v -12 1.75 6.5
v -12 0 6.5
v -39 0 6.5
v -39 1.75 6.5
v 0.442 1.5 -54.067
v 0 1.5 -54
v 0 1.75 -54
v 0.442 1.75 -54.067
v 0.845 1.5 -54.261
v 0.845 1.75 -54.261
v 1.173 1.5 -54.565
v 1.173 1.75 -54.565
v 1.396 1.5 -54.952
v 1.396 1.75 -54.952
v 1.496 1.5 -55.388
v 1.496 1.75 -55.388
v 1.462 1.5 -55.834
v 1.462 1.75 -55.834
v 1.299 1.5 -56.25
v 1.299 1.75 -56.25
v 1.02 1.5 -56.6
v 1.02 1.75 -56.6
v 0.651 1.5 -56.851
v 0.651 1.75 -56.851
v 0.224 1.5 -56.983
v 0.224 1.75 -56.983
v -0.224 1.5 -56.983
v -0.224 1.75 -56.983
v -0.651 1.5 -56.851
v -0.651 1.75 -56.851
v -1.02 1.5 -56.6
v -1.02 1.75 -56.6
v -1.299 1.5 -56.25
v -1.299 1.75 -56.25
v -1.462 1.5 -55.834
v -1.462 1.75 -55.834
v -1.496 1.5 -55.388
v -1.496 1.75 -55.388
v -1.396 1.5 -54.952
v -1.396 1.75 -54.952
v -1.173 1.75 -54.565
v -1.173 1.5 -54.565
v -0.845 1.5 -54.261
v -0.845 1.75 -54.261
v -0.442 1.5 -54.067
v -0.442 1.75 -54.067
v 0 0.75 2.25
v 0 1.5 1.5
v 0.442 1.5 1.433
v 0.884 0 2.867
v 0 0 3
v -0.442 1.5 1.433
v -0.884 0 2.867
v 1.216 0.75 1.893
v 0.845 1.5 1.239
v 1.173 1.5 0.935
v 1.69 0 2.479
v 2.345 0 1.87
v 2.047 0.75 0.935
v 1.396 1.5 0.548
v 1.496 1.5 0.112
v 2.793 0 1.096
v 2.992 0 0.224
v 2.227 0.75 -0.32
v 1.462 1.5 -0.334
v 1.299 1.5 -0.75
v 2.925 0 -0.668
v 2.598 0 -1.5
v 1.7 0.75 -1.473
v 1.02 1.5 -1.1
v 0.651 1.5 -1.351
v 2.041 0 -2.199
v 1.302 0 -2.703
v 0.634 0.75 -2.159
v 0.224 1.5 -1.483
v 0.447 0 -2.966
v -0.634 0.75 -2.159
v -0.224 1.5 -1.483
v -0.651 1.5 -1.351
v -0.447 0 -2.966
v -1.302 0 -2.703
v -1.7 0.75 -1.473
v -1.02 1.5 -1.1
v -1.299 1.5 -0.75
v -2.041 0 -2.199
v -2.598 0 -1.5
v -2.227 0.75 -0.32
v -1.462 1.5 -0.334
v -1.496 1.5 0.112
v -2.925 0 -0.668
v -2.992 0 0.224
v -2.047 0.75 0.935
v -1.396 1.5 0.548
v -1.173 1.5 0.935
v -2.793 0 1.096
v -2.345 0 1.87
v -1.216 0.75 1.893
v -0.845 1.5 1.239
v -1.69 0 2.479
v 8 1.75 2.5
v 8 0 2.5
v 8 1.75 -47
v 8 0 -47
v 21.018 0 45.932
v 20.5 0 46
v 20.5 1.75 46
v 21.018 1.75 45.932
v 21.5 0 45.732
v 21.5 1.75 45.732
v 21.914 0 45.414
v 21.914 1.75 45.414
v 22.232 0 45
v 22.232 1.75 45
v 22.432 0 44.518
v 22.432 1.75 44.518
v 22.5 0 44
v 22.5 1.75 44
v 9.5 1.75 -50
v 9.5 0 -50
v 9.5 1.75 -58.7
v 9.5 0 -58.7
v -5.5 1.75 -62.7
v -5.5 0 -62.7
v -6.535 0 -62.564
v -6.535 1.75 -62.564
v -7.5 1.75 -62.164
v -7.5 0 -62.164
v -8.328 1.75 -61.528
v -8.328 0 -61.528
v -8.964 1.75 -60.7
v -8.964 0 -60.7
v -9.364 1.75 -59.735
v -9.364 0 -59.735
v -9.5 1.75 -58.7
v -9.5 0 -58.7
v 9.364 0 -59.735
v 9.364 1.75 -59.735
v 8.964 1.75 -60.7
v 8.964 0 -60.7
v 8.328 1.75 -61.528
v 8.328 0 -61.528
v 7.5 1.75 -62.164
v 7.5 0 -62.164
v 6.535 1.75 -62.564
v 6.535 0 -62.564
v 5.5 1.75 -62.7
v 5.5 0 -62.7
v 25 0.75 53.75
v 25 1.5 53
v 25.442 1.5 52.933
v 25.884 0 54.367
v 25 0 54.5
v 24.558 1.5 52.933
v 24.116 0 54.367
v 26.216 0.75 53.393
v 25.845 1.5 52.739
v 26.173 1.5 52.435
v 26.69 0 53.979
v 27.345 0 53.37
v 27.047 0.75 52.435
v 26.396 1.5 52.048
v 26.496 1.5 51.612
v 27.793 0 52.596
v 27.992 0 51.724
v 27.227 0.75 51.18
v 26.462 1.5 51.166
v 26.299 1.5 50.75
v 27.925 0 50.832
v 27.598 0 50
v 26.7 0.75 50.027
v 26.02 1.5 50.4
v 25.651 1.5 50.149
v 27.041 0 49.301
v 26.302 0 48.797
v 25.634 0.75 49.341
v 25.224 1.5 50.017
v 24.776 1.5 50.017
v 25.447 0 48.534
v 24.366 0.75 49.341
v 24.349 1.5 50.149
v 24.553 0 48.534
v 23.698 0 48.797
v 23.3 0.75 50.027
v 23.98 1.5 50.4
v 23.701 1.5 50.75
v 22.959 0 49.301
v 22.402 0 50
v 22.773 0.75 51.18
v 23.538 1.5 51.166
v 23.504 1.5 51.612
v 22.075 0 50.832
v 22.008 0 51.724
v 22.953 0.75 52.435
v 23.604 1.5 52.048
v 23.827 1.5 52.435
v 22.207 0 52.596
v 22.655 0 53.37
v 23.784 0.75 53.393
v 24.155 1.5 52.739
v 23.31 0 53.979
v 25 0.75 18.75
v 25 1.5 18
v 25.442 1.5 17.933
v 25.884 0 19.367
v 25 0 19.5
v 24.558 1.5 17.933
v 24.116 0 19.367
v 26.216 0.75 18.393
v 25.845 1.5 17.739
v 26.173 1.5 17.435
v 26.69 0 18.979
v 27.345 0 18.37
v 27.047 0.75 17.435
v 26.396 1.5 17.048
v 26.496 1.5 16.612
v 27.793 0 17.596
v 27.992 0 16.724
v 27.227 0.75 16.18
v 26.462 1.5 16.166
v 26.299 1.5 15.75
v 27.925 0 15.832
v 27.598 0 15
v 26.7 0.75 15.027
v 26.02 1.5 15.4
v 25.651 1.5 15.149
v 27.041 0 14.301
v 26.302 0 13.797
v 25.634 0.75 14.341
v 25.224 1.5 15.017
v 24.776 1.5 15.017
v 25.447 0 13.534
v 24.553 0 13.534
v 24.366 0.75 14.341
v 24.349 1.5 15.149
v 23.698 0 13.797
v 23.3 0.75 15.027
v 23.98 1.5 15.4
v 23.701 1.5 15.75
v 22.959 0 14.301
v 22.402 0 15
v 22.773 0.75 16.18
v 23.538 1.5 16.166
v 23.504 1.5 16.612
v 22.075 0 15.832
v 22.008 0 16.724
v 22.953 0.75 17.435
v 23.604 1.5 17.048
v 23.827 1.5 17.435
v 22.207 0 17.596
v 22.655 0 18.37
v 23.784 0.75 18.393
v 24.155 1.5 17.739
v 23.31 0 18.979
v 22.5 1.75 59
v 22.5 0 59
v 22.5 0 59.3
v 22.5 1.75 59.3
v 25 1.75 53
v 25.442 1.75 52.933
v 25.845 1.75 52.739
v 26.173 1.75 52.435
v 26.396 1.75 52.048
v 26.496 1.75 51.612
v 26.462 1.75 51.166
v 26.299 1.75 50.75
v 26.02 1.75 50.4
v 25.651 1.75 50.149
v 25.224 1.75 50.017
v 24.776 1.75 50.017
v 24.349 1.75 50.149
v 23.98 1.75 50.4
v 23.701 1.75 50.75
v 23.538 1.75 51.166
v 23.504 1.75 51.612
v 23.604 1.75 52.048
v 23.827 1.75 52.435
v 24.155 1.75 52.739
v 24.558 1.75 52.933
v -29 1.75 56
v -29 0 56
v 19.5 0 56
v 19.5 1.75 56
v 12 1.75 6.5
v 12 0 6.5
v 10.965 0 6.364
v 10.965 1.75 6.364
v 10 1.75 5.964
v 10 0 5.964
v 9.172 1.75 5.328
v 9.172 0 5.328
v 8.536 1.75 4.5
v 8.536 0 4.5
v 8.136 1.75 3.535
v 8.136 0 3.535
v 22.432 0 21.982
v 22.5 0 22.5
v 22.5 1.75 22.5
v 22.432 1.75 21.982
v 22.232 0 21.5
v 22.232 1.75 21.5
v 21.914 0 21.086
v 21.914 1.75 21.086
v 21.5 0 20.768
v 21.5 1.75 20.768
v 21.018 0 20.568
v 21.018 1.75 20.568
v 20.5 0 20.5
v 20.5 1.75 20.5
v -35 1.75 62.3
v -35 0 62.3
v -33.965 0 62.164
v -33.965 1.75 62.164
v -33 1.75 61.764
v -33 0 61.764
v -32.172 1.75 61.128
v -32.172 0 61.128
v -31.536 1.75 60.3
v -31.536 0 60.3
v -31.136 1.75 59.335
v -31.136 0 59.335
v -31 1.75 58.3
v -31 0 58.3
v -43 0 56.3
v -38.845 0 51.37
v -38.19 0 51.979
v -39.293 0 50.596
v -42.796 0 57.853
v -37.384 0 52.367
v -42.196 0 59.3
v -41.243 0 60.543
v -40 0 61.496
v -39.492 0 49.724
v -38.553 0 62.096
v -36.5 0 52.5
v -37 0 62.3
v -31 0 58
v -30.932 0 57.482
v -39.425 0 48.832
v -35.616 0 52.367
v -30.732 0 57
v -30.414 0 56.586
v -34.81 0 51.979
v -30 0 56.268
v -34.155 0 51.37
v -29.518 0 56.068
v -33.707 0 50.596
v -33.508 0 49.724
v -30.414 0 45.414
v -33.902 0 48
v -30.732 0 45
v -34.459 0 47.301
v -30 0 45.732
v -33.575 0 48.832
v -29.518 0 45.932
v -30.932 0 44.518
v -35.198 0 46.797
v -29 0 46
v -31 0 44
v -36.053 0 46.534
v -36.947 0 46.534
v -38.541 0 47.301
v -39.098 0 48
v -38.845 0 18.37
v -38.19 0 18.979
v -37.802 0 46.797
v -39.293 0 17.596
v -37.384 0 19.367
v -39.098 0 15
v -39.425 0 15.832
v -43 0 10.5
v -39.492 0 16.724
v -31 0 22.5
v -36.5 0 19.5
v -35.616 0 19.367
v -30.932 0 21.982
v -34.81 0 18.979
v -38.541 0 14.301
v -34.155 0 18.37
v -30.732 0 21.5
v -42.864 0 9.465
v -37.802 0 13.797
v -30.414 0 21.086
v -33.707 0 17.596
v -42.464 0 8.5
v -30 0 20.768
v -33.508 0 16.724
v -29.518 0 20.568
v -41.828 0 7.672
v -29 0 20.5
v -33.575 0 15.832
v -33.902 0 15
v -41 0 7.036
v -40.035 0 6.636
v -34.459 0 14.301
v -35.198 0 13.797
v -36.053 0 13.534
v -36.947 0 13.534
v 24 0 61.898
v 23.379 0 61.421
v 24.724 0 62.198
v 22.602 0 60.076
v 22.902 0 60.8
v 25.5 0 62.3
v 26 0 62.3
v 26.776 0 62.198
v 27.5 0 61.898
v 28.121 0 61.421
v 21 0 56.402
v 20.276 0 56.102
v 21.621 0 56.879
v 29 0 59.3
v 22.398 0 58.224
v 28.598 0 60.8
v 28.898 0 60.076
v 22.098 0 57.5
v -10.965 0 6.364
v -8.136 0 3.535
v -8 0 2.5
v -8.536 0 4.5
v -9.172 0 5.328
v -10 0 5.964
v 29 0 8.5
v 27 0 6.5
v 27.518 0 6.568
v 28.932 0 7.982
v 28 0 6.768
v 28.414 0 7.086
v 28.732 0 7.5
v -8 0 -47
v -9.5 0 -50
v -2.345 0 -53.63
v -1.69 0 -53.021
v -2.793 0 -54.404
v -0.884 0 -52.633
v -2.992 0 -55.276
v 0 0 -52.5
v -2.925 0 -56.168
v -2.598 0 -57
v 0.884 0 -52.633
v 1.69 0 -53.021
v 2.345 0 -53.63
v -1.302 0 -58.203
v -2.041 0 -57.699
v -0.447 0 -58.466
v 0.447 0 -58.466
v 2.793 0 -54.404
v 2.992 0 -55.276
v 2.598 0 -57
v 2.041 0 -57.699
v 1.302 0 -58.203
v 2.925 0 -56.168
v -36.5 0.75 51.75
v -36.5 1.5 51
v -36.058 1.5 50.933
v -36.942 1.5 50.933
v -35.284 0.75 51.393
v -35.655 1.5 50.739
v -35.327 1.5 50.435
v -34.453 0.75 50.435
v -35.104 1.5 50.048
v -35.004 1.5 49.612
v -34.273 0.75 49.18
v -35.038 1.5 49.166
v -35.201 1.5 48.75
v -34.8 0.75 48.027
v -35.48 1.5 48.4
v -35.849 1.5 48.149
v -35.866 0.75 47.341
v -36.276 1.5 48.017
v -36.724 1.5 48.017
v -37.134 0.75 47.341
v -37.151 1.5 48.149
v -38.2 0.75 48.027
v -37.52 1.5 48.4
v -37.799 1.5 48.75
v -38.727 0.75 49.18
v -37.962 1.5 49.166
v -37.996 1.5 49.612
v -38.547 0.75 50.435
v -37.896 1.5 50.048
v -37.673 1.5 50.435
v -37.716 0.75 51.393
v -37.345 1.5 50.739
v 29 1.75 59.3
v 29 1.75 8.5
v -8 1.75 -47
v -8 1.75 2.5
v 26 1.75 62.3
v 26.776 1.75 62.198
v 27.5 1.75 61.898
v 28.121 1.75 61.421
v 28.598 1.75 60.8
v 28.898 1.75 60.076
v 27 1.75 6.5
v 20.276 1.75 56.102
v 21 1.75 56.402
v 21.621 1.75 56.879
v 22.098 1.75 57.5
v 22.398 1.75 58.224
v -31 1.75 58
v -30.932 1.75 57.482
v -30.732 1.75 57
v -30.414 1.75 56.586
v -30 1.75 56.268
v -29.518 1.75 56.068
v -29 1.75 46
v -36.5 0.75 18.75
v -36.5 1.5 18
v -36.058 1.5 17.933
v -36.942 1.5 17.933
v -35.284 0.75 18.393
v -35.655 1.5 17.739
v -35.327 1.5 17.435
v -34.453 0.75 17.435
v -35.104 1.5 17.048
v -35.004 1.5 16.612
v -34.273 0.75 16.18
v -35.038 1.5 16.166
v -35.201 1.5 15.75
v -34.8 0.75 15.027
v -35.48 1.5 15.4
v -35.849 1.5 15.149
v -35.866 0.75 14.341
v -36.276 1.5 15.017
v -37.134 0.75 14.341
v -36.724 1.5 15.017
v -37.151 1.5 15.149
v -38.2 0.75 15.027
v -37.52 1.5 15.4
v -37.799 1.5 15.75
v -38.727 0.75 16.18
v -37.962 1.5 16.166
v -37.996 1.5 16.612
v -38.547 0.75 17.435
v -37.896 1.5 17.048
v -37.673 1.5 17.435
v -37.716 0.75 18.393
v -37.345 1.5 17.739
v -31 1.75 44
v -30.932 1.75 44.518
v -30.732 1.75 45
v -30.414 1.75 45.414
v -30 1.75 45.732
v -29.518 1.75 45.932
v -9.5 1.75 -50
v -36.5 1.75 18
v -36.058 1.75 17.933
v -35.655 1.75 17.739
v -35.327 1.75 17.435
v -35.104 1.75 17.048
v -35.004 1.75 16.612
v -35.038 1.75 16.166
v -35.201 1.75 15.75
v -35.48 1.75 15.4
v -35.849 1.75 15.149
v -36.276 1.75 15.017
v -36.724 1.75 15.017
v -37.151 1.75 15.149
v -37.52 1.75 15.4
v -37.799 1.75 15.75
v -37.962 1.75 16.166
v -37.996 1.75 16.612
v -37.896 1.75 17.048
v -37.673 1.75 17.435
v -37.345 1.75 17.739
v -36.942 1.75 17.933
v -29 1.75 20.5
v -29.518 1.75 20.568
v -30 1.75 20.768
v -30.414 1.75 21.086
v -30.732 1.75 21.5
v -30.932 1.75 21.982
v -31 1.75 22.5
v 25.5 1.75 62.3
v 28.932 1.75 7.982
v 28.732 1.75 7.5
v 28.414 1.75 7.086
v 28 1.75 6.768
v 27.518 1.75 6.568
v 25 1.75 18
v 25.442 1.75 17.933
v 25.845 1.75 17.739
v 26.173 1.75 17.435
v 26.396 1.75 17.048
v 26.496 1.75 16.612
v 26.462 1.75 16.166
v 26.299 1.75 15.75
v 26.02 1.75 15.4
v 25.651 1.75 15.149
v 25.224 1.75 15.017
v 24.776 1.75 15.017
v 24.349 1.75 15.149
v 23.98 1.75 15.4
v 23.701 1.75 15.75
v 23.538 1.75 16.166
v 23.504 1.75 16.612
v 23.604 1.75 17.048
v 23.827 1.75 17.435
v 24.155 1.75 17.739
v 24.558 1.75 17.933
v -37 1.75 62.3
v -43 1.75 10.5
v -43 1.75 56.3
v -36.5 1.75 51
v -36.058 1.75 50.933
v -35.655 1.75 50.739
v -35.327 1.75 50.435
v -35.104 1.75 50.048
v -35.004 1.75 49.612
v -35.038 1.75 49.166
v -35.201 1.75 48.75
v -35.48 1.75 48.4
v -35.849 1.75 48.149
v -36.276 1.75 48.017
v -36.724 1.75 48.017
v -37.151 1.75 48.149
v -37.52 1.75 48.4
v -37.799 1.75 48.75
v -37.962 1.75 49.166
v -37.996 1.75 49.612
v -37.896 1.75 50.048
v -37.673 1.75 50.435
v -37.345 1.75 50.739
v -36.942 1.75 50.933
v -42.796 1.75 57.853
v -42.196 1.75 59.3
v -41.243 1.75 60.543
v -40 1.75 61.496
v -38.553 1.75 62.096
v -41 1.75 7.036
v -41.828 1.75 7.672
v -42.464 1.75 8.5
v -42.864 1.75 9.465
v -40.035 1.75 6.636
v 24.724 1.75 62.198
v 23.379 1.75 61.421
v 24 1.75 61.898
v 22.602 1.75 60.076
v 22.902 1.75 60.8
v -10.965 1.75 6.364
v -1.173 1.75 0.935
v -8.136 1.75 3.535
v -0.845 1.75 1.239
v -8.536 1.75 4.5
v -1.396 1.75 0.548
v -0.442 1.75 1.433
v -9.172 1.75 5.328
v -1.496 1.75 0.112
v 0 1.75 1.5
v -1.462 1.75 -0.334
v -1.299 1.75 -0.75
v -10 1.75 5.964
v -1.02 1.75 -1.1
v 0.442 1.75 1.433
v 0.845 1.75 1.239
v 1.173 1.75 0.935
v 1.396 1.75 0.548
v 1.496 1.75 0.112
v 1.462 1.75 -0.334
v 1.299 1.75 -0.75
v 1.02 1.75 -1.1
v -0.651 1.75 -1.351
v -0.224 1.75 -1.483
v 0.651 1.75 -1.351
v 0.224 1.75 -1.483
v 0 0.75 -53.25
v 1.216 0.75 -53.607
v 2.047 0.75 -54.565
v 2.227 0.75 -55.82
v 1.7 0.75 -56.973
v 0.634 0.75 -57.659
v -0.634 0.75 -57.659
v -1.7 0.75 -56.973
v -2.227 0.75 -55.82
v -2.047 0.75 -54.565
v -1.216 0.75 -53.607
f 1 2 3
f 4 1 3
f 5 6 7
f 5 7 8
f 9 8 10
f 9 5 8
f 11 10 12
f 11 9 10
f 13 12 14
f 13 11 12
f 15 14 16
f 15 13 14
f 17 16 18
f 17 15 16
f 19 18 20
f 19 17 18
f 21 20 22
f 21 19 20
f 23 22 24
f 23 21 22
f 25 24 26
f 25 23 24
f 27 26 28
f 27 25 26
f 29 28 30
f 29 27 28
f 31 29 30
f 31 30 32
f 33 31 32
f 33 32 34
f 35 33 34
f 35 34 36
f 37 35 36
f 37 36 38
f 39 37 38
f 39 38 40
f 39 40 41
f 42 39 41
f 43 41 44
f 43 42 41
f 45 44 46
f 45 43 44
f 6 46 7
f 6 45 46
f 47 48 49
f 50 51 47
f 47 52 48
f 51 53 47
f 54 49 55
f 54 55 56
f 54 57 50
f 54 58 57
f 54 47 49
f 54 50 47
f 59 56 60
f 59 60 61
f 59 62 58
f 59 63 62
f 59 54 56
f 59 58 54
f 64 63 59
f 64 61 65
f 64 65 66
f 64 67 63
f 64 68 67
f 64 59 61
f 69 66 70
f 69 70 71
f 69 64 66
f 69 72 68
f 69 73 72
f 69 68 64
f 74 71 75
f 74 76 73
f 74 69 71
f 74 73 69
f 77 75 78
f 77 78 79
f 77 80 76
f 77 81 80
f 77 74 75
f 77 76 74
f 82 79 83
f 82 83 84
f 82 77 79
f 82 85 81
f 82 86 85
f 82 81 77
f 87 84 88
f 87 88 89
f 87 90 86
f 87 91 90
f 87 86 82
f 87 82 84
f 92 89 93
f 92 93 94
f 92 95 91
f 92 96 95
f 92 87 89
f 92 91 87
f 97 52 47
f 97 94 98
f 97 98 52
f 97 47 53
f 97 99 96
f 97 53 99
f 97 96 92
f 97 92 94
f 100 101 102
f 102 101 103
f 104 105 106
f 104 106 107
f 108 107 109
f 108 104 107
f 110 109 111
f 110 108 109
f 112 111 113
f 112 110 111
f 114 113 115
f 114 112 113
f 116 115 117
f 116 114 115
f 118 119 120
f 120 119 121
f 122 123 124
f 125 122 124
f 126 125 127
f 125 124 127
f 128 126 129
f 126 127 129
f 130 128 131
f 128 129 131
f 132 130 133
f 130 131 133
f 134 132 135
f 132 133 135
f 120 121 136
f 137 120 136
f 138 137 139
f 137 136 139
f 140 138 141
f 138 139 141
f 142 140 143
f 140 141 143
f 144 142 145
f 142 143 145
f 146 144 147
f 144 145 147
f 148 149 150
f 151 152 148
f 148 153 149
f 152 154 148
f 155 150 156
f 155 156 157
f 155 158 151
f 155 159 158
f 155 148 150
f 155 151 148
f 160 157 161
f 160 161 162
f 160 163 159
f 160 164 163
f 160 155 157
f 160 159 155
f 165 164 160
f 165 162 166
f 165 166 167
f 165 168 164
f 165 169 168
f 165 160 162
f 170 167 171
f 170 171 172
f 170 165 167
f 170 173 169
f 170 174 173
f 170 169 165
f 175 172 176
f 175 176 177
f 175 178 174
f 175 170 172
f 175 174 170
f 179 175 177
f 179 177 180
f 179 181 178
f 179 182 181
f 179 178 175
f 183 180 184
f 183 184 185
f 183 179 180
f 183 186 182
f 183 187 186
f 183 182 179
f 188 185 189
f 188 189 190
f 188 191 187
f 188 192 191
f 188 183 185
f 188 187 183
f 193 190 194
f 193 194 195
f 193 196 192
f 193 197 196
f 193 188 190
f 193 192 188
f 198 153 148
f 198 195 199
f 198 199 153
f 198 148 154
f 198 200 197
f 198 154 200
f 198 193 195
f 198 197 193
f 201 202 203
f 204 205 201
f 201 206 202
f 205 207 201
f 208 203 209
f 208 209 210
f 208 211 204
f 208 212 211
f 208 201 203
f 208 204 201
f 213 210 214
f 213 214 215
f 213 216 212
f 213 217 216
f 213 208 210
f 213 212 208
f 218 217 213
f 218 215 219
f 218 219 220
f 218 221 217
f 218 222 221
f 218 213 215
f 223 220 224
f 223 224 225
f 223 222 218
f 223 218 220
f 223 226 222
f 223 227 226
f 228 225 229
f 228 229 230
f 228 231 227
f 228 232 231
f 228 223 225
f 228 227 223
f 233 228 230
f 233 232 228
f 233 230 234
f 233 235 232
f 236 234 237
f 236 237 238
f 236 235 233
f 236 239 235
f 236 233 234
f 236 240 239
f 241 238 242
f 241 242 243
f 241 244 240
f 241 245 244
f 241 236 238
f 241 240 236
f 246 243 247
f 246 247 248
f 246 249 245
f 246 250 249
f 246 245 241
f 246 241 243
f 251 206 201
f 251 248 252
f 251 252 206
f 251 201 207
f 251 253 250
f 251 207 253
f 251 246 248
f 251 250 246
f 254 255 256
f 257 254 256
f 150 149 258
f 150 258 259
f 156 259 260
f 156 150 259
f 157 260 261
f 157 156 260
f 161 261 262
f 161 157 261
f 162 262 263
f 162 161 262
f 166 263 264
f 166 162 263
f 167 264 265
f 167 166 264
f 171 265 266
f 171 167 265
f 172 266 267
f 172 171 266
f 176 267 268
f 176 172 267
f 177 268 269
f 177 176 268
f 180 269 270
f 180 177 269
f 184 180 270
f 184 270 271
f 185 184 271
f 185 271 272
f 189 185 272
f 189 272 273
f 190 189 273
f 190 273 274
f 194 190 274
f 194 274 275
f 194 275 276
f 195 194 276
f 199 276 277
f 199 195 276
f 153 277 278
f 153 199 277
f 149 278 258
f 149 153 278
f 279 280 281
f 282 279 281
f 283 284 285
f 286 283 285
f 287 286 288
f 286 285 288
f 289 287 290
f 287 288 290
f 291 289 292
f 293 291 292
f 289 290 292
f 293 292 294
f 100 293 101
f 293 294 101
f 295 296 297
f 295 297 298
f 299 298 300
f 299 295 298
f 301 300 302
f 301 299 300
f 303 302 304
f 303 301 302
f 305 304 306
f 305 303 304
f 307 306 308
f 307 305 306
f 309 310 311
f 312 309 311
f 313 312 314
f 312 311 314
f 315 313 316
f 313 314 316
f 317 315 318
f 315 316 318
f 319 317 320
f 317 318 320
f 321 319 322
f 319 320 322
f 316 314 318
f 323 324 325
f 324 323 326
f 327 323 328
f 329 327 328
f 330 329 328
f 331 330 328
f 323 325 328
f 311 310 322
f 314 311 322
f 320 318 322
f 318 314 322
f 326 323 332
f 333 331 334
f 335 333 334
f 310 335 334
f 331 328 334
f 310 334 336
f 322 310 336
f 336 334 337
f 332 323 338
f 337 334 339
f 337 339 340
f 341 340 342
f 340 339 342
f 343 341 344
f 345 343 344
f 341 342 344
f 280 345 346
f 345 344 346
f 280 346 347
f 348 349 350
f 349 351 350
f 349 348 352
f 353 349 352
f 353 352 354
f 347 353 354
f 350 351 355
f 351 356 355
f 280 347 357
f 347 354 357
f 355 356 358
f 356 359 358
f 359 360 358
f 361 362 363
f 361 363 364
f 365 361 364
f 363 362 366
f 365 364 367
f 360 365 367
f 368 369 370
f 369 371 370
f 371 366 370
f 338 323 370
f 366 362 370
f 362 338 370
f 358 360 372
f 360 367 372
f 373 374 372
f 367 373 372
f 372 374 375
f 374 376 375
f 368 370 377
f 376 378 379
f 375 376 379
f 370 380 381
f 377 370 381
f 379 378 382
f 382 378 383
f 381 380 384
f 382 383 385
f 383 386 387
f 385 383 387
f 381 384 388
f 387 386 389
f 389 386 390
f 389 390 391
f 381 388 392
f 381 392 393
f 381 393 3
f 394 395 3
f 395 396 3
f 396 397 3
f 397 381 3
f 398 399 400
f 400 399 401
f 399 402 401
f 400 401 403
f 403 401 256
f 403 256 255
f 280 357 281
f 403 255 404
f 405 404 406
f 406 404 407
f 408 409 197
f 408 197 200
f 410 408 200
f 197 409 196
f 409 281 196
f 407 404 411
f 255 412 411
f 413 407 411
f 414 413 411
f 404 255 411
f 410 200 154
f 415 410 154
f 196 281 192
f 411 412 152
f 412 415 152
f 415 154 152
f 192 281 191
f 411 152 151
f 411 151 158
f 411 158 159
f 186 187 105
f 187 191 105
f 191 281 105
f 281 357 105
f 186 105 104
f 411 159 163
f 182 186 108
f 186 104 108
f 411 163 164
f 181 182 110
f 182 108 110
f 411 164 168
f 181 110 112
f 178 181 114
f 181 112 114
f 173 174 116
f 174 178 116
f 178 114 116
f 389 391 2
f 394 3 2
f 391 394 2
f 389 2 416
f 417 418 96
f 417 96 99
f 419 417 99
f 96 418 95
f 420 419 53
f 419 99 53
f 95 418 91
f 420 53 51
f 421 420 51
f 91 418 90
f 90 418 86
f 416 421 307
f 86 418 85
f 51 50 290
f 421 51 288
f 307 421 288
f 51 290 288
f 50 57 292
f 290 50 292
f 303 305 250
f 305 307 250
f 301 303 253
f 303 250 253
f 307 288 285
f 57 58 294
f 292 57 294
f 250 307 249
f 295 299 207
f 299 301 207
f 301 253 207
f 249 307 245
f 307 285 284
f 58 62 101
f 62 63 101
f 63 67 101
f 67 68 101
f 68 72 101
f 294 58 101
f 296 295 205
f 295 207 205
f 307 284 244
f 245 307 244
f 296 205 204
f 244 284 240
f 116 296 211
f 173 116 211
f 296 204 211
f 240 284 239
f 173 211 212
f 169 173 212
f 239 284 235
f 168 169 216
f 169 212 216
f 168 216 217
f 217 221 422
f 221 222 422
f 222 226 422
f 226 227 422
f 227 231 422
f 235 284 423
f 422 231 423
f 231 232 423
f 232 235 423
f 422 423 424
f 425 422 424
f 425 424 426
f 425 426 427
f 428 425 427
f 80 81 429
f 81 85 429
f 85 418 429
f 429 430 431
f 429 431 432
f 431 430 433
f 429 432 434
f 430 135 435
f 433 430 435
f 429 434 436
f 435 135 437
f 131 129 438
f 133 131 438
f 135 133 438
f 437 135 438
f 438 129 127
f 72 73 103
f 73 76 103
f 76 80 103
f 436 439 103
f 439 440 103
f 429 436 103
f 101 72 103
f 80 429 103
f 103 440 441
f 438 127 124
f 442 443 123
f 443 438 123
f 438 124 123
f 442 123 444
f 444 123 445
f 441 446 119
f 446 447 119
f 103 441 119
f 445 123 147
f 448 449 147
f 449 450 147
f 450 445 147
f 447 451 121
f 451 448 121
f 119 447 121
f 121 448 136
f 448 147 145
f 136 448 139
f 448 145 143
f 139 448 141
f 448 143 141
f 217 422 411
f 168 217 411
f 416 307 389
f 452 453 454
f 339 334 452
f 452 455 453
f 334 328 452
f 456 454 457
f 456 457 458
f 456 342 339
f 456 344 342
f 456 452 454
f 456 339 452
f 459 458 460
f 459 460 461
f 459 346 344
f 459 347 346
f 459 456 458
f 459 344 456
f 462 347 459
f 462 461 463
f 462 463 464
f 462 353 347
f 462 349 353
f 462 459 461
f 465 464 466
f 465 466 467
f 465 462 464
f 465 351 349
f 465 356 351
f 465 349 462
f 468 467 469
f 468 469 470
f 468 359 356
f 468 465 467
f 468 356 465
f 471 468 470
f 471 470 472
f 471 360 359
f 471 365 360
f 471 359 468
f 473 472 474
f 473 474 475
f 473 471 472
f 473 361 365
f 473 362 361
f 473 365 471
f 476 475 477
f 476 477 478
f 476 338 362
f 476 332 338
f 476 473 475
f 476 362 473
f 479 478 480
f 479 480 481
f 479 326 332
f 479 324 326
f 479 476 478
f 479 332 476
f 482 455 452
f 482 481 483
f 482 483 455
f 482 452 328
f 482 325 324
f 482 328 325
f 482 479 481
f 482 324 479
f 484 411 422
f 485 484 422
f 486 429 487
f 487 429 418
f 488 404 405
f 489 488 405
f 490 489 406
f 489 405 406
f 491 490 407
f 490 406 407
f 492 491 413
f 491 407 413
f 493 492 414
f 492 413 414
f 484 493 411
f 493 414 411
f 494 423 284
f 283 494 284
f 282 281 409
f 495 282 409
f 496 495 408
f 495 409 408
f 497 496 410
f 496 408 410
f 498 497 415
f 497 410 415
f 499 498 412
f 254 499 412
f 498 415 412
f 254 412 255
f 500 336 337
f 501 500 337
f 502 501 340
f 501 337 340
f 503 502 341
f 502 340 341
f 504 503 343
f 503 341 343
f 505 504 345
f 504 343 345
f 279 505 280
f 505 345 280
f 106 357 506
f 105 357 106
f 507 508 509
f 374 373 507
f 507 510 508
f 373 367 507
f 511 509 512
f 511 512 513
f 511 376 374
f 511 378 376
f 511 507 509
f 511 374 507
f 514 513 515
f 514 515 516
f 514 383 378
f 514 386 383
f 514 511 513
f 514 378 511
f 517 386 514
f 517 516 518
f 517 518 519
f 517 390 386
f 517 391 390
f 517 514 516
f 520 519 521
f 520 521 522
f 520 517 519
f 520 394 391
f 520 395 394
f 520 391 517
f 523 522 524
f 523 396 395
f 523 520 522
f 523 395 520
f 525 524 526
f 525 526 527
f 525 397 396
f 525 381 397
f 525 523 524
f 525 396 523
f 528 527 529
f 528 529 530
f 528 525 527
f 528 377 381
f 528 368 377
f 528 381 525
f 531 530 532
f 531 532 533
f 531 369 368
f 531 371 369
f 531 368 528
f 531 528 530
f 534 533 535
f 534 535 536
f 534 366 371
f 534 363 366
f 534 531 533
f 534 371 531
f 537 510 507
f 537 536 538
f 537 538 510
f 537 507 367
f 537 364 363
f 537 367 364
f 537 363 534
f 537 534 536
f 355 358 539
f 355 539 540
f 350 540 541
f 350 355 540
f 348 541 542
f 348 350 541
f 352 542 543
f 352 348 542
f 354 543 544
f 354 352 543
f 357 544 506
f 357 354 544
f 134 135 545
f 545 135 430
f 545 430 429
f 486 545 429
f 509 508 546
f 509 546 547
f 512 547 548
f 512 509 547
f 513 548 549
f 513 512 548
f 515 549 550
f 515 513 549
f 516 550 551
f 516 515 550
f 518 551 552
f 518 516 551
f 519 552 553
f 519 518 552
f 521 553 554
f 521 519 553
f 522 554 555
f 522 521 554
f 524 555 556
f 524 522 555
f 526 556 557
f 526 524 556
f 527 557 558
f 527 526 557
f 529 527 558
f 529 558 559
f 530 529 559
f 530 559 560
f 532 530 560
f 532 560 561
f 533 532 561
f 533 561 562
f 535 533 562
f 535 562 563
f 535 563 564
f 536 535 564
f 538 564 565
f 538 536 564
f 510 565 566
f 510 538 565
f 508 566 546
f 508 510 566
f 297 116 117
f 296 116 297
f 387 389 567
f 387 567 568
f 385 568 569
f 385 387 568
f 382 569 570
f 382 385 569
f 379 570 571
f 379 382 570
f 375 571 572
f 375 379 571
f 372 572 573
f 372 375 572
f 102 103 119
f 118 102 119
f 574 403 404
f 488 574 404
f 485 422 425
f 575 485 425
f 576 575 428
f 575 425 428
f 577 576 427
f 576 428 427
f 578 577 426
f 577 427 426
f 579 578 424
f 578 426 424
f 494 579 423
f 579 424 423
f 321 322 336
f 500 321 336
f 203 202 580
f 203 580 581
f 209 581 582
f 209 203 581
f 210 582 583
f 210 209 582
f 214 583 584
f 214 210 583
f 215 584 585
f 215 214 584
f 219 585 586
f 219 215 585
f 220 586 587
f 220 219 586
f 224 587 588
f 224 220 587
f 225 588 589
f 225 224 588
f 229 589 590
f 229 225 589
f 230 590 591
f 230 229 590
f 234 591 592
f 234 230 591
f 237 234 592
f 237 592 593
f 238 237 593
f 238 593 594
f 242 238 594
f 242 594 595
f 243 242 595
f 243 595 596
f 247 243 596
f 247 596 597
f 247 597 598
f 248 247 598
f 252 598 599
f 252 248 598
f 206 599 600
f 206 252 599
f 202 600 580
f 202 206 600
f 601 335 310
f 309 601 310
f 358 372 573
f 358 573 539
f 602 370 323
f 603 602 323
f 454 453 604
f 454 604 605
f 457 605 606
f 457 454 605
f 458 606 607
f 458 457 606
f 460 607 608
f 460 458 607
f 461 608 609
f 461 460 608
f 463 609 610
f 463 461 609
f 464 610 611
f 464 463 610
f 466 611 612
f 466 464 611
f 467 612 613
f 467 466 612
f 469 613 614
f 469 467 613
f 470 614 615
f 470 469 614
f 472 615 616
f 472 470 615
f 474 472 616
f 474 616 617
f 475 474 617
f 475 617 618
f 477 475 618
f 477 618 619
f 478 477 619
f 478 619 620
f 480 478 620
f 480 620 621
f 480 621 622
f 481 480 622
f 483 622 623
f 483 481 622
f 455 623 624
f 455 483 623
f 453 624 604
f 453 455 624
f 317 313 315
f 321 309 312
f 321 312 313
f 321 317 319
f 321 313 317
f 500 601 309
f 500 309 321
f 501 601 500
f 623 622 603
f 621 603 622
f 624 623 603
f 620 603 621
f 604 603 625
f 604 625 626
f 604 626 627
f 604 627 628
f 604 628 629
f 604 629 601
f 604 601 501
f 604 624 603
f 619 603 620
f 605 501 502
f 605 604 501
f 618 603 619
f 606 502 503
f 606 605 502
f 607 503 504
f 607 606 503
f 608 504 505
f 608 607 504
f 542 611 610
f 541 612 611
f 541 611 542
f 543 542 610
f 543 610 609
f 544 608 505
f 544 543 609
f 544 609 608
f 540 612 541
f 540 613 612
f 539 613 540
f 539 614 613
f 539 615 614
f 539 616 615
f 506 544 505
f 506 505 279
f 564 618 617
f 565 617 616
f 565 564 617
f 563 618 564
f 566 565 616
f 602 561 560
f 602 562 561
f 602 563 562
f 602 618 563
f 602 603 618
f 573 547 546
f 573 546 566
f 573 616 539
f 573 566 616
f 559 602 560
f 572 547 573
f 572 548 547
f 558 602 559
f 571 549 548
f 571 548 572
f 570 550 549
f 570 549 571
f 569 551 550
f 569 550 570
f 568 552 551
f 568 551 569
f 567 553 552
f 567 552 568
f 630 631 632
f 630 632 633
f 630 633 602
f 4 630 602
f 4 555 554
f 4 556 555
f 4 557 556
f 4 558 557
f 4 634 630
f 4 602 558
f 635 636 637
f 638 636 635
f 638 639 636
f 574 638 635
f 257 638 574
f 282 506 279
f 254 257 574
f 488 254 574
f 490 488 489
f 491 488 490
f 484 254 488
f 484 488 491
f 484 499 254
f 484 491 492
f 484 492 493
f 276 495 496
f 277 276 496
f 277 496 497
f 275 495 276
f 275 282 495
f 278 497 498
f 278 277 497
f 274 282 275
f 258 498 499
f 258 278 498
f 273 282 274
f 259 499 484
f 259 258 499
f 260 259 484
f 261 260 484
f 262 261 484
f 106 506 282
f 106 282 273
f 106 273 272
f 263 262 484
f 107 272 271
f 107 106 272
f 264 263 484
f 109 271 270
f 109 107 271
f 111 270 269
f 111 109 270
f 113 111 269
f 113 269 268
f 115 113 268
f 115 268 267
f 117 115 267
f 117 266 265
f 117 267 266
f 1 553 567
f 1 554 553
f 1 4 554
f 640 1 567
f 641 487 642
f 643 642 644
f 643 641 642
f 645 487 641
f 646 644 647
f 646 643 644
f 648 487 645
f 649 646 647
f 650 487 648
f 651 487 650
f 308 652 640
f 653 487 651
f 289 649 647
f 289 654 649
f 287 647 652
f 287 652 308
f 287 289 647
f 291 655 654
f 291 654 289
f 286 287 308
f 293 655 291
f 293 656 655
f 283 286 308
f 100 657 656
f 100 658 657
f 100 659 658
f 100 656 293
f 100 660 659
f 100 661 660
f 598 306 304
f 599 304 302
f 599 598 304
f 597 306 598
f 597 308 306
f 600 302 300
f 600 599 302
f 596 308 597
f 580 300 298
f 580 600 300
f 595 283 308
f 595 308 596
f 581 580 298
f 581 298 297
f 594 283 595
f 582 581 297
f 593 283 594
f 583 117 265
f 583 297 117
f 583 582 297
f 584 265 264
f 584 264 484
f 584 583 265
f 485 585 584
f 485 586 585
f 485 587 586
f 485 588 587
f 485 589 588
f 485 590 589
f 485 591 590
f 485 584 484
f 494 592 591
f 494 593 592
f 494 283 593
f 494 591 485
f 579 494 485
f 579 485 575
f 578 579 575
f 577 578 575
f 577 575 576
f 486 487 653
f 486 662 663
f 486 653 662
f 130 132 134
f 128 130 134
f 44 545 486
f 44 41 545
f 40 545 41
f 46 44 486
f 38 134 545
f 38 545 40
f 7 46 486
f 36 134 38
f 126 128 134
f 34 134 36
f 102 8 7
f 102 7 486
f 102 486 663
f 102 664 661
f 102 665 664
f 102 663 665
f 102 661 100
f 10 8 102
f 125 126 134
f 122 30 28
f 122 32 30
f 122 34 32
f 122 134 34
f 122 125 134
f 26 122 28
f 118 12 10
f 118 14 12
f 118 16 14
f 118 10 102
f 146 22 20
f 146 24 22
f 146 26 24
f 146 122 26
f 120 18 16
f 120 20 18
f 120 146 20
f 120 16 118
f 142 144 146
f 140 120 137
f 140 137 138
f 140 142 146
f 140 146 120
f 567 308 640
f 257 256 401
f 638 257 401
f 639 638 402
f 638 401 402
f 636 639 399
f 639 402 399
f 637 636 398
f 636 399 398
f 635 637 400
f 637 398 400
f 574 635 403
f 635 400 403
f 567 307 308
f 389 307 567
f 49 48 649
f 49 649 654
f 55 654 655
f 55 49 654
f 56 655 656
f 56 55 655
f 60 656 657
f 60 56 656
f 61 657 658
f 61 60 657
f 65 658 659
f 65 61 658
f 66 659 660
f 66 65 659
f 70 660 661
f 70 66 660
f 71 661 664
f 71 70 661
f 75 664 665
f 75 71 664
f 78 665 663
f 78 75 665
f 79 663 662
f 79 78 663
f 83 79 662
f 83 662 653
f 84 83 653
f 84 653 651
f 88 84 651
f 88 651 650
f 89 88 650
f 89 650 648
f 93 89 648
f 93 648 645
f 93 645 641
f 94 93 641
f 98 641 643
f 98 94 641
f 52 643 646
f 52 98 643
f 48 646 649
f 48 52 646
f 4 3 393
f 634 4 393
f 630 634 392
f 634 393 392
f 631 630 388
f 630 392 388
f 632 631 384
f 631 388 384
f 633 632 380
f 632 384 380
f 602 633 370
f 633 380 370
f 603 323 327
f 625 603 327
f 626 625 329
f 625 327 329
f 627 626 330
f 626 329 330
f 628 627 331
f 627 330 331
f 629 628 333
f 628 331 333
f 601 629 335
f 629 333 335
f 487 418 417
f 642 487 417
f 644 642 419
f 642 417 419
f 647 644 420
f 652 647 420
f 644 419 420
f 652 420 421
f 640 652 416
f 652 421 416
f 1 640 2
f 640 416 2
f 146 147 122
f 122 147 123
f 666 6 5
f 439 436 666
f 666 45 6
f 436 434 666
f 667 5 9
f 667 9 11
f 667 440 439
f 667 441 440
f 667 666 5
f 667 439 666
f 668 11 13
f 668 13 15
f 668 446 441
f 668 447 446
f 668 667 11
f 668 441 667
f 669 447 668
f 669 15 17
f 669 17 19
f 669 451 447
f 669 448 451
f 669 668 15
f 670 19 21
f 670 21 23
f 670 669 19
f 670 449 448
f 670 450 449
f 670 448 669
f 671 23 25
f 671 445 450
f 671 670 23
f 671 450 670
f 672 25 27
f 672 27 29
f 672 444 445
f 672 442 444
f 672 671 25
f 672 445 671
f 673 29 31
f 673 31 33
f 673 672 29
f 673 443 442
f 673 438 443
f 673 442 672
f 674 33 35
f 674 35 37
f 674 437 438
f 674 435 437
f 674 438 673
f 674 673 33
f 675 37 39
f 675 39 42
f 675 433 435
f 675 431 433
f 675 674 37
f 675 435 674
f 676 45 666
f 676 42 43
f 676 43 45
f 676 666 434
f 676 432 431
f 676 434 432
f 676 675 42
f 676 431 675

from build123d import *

# Parameters (mm, degrees)
SKETCH1_R           = 1.5
BOSS_EXTRUDE1_DEPTH = 1.75
CHAMFER1_SIZE       = 1.5


with BuildPart() as part:
    # Sketch1 → Boss-Extrude1 (new body)
    with BuildSketch(Plane(origin=(0, 0, 0), x_dir=(1, 0, 0), z_dir=(0, 1, 0))):
        with BuildLine():
            Line((8, 0), (8, 47))
            Line((8, 47), (9.5, 50))
            Line((9.5, 50), (9.5, 58.7))
            ThreePointArc((9.5, 58.7), (8.328427125, 61.528427125), (5.5, 62.7))
            Line((5.5, 62.7), (-5.5, 62.7))
            ThreePointArc((-5.5, 62.7), (-8.328427125, 61.528427125), (-9.5, 58.7))
            Line((-9.5, 58.7), (-9.5, 50))
            Line((-9.5, 50), (-8, 47))
            Line((-8, 47), (-8, 0))
            Line((-8, 0), (-8, -2.5))
            ThreePointArc((-8, -2.5), (-9.171572875, -5.328427125), (-12, -6.5))
            Line((-12, -6.5), (-39, -6.5))
            ThreePointArc((-39, -6.5), (-41.828427125, -7.671572875), (-43, -10.5))
            Line((-43, -10.5), (-43, -56))
            Line((-43, -56), (-43, -56.3))
            ThreePointArc((-43, -56.3), (-41.242640687, -60.542640687), (-37, -62.3))
            Line((-37, -62.3), (-35, -62.3))
            ThreePointArc((-35, -62.3), (-32.171572875, -61.128427125), (-31, -58.3))
            Line((-31, -58.3), (-31, -58))
            ThreePointArc((-31, -58), (-30.414213562, -56.585786438), (-29, -56))
            Line((-29, -56), (19.5, -56))
            ThreePointArc((19.5, -56), (21.621320344, -56.878679656), (22.5, -59))
            Line((22.5, -59), (22.5, -59.3))
            ThreePointArc((22.5, -59.3), (23.378679656, -61.421320344), (25.5, -62.3))
            Line((25.5, -62.3), (26, -62.3))
            ThreePointArc((26, -62.3), (28.121320344, -61.421320344), (29, -59.3))
            Line((29, -59.3), (29, -56))
            Line((29, -56), (29, -8.5))
            ThreePointArc((29, -8.5), (28.414213562, -7.085786438), (27, -6.5))
            Line((27, -6.5), (12, -6.5))
            ThreePointArc((12, -6.5), (9.171572875, -5.328427125), (8, -2.5))
            Line((8, -2.5), (8, 0))
        make_face()
        with Locations(Location((0, 0, 0), (0, 0, 270))):
            Circle(SKETCH1_R, mode=Mode.SUBTRACT)
        with Locations(Location((0, 55.5, 0), (0, 0, 270))):
            Circle(SKETCH1_R, mode=Mode.SUBTRACT)
        with Locations(Location((25, -16.5, 0), (0, 0, 270))):
            Circle(SKETCH1_R, mode=Mode.SUBTRACT)
        with Locations(Location((25, -51.5, 0), (0, 0, 270))):
            Circle(SKETCH1_R, mode=Mode.SUBTRACT)
        with Locations(Location((-36.5, -16.5, 0), (0, 0, 270))):
            Circle(SKETCH1_R, mode=Mode.SUBTRACT)
        with Locations(Location((-36.5, -49.5, 0), (0, 0, 270))):
            Circle(SKETCH1_R, mode=Mode.SUBTRACT)
        with BuildLine():
            Line((-31, -22.5), (-31, -44))
            ThreePointArc((-31, -44), (-30.414213562, -45.414213562), (-29, -46))
            Line((-29, -46), (20.5, -46))
            ThreePointArc((20.5, -46), (21.914213562, -45.414213562), (22.5, -44))
            Line((22.5, -44), (22.5, -22.5))
            ThreePointArc((22.5, -22.5), (21.914213562, -21.085786438), (20.5, -20.5))
            Line((20.5, -20.5), (-29, -20.5))
            ThreePointArc((-29, -20.5), (-30.414213562, -21.085786438), (-31, -22.5))
        make_face(mode=Mode.SUBTRACT)
    extrude(amount=BOSS_EXTRUDE1_DEPTH)

    # Chamfer1
    chamfer1_edges = [part.edges().sort_by_distance(p)[0] for p in [
        (25, 0, 15),
        (25, 0, 50),
        (-36.5, 0, 15),
        (-36.5, 0, 48),
        (0, 0, -1.5),
        (0, 0, -57),
    ]]
    chamfer(chamfer1_edges, length=CHAMFER1_SIZE)


solid = part.part
